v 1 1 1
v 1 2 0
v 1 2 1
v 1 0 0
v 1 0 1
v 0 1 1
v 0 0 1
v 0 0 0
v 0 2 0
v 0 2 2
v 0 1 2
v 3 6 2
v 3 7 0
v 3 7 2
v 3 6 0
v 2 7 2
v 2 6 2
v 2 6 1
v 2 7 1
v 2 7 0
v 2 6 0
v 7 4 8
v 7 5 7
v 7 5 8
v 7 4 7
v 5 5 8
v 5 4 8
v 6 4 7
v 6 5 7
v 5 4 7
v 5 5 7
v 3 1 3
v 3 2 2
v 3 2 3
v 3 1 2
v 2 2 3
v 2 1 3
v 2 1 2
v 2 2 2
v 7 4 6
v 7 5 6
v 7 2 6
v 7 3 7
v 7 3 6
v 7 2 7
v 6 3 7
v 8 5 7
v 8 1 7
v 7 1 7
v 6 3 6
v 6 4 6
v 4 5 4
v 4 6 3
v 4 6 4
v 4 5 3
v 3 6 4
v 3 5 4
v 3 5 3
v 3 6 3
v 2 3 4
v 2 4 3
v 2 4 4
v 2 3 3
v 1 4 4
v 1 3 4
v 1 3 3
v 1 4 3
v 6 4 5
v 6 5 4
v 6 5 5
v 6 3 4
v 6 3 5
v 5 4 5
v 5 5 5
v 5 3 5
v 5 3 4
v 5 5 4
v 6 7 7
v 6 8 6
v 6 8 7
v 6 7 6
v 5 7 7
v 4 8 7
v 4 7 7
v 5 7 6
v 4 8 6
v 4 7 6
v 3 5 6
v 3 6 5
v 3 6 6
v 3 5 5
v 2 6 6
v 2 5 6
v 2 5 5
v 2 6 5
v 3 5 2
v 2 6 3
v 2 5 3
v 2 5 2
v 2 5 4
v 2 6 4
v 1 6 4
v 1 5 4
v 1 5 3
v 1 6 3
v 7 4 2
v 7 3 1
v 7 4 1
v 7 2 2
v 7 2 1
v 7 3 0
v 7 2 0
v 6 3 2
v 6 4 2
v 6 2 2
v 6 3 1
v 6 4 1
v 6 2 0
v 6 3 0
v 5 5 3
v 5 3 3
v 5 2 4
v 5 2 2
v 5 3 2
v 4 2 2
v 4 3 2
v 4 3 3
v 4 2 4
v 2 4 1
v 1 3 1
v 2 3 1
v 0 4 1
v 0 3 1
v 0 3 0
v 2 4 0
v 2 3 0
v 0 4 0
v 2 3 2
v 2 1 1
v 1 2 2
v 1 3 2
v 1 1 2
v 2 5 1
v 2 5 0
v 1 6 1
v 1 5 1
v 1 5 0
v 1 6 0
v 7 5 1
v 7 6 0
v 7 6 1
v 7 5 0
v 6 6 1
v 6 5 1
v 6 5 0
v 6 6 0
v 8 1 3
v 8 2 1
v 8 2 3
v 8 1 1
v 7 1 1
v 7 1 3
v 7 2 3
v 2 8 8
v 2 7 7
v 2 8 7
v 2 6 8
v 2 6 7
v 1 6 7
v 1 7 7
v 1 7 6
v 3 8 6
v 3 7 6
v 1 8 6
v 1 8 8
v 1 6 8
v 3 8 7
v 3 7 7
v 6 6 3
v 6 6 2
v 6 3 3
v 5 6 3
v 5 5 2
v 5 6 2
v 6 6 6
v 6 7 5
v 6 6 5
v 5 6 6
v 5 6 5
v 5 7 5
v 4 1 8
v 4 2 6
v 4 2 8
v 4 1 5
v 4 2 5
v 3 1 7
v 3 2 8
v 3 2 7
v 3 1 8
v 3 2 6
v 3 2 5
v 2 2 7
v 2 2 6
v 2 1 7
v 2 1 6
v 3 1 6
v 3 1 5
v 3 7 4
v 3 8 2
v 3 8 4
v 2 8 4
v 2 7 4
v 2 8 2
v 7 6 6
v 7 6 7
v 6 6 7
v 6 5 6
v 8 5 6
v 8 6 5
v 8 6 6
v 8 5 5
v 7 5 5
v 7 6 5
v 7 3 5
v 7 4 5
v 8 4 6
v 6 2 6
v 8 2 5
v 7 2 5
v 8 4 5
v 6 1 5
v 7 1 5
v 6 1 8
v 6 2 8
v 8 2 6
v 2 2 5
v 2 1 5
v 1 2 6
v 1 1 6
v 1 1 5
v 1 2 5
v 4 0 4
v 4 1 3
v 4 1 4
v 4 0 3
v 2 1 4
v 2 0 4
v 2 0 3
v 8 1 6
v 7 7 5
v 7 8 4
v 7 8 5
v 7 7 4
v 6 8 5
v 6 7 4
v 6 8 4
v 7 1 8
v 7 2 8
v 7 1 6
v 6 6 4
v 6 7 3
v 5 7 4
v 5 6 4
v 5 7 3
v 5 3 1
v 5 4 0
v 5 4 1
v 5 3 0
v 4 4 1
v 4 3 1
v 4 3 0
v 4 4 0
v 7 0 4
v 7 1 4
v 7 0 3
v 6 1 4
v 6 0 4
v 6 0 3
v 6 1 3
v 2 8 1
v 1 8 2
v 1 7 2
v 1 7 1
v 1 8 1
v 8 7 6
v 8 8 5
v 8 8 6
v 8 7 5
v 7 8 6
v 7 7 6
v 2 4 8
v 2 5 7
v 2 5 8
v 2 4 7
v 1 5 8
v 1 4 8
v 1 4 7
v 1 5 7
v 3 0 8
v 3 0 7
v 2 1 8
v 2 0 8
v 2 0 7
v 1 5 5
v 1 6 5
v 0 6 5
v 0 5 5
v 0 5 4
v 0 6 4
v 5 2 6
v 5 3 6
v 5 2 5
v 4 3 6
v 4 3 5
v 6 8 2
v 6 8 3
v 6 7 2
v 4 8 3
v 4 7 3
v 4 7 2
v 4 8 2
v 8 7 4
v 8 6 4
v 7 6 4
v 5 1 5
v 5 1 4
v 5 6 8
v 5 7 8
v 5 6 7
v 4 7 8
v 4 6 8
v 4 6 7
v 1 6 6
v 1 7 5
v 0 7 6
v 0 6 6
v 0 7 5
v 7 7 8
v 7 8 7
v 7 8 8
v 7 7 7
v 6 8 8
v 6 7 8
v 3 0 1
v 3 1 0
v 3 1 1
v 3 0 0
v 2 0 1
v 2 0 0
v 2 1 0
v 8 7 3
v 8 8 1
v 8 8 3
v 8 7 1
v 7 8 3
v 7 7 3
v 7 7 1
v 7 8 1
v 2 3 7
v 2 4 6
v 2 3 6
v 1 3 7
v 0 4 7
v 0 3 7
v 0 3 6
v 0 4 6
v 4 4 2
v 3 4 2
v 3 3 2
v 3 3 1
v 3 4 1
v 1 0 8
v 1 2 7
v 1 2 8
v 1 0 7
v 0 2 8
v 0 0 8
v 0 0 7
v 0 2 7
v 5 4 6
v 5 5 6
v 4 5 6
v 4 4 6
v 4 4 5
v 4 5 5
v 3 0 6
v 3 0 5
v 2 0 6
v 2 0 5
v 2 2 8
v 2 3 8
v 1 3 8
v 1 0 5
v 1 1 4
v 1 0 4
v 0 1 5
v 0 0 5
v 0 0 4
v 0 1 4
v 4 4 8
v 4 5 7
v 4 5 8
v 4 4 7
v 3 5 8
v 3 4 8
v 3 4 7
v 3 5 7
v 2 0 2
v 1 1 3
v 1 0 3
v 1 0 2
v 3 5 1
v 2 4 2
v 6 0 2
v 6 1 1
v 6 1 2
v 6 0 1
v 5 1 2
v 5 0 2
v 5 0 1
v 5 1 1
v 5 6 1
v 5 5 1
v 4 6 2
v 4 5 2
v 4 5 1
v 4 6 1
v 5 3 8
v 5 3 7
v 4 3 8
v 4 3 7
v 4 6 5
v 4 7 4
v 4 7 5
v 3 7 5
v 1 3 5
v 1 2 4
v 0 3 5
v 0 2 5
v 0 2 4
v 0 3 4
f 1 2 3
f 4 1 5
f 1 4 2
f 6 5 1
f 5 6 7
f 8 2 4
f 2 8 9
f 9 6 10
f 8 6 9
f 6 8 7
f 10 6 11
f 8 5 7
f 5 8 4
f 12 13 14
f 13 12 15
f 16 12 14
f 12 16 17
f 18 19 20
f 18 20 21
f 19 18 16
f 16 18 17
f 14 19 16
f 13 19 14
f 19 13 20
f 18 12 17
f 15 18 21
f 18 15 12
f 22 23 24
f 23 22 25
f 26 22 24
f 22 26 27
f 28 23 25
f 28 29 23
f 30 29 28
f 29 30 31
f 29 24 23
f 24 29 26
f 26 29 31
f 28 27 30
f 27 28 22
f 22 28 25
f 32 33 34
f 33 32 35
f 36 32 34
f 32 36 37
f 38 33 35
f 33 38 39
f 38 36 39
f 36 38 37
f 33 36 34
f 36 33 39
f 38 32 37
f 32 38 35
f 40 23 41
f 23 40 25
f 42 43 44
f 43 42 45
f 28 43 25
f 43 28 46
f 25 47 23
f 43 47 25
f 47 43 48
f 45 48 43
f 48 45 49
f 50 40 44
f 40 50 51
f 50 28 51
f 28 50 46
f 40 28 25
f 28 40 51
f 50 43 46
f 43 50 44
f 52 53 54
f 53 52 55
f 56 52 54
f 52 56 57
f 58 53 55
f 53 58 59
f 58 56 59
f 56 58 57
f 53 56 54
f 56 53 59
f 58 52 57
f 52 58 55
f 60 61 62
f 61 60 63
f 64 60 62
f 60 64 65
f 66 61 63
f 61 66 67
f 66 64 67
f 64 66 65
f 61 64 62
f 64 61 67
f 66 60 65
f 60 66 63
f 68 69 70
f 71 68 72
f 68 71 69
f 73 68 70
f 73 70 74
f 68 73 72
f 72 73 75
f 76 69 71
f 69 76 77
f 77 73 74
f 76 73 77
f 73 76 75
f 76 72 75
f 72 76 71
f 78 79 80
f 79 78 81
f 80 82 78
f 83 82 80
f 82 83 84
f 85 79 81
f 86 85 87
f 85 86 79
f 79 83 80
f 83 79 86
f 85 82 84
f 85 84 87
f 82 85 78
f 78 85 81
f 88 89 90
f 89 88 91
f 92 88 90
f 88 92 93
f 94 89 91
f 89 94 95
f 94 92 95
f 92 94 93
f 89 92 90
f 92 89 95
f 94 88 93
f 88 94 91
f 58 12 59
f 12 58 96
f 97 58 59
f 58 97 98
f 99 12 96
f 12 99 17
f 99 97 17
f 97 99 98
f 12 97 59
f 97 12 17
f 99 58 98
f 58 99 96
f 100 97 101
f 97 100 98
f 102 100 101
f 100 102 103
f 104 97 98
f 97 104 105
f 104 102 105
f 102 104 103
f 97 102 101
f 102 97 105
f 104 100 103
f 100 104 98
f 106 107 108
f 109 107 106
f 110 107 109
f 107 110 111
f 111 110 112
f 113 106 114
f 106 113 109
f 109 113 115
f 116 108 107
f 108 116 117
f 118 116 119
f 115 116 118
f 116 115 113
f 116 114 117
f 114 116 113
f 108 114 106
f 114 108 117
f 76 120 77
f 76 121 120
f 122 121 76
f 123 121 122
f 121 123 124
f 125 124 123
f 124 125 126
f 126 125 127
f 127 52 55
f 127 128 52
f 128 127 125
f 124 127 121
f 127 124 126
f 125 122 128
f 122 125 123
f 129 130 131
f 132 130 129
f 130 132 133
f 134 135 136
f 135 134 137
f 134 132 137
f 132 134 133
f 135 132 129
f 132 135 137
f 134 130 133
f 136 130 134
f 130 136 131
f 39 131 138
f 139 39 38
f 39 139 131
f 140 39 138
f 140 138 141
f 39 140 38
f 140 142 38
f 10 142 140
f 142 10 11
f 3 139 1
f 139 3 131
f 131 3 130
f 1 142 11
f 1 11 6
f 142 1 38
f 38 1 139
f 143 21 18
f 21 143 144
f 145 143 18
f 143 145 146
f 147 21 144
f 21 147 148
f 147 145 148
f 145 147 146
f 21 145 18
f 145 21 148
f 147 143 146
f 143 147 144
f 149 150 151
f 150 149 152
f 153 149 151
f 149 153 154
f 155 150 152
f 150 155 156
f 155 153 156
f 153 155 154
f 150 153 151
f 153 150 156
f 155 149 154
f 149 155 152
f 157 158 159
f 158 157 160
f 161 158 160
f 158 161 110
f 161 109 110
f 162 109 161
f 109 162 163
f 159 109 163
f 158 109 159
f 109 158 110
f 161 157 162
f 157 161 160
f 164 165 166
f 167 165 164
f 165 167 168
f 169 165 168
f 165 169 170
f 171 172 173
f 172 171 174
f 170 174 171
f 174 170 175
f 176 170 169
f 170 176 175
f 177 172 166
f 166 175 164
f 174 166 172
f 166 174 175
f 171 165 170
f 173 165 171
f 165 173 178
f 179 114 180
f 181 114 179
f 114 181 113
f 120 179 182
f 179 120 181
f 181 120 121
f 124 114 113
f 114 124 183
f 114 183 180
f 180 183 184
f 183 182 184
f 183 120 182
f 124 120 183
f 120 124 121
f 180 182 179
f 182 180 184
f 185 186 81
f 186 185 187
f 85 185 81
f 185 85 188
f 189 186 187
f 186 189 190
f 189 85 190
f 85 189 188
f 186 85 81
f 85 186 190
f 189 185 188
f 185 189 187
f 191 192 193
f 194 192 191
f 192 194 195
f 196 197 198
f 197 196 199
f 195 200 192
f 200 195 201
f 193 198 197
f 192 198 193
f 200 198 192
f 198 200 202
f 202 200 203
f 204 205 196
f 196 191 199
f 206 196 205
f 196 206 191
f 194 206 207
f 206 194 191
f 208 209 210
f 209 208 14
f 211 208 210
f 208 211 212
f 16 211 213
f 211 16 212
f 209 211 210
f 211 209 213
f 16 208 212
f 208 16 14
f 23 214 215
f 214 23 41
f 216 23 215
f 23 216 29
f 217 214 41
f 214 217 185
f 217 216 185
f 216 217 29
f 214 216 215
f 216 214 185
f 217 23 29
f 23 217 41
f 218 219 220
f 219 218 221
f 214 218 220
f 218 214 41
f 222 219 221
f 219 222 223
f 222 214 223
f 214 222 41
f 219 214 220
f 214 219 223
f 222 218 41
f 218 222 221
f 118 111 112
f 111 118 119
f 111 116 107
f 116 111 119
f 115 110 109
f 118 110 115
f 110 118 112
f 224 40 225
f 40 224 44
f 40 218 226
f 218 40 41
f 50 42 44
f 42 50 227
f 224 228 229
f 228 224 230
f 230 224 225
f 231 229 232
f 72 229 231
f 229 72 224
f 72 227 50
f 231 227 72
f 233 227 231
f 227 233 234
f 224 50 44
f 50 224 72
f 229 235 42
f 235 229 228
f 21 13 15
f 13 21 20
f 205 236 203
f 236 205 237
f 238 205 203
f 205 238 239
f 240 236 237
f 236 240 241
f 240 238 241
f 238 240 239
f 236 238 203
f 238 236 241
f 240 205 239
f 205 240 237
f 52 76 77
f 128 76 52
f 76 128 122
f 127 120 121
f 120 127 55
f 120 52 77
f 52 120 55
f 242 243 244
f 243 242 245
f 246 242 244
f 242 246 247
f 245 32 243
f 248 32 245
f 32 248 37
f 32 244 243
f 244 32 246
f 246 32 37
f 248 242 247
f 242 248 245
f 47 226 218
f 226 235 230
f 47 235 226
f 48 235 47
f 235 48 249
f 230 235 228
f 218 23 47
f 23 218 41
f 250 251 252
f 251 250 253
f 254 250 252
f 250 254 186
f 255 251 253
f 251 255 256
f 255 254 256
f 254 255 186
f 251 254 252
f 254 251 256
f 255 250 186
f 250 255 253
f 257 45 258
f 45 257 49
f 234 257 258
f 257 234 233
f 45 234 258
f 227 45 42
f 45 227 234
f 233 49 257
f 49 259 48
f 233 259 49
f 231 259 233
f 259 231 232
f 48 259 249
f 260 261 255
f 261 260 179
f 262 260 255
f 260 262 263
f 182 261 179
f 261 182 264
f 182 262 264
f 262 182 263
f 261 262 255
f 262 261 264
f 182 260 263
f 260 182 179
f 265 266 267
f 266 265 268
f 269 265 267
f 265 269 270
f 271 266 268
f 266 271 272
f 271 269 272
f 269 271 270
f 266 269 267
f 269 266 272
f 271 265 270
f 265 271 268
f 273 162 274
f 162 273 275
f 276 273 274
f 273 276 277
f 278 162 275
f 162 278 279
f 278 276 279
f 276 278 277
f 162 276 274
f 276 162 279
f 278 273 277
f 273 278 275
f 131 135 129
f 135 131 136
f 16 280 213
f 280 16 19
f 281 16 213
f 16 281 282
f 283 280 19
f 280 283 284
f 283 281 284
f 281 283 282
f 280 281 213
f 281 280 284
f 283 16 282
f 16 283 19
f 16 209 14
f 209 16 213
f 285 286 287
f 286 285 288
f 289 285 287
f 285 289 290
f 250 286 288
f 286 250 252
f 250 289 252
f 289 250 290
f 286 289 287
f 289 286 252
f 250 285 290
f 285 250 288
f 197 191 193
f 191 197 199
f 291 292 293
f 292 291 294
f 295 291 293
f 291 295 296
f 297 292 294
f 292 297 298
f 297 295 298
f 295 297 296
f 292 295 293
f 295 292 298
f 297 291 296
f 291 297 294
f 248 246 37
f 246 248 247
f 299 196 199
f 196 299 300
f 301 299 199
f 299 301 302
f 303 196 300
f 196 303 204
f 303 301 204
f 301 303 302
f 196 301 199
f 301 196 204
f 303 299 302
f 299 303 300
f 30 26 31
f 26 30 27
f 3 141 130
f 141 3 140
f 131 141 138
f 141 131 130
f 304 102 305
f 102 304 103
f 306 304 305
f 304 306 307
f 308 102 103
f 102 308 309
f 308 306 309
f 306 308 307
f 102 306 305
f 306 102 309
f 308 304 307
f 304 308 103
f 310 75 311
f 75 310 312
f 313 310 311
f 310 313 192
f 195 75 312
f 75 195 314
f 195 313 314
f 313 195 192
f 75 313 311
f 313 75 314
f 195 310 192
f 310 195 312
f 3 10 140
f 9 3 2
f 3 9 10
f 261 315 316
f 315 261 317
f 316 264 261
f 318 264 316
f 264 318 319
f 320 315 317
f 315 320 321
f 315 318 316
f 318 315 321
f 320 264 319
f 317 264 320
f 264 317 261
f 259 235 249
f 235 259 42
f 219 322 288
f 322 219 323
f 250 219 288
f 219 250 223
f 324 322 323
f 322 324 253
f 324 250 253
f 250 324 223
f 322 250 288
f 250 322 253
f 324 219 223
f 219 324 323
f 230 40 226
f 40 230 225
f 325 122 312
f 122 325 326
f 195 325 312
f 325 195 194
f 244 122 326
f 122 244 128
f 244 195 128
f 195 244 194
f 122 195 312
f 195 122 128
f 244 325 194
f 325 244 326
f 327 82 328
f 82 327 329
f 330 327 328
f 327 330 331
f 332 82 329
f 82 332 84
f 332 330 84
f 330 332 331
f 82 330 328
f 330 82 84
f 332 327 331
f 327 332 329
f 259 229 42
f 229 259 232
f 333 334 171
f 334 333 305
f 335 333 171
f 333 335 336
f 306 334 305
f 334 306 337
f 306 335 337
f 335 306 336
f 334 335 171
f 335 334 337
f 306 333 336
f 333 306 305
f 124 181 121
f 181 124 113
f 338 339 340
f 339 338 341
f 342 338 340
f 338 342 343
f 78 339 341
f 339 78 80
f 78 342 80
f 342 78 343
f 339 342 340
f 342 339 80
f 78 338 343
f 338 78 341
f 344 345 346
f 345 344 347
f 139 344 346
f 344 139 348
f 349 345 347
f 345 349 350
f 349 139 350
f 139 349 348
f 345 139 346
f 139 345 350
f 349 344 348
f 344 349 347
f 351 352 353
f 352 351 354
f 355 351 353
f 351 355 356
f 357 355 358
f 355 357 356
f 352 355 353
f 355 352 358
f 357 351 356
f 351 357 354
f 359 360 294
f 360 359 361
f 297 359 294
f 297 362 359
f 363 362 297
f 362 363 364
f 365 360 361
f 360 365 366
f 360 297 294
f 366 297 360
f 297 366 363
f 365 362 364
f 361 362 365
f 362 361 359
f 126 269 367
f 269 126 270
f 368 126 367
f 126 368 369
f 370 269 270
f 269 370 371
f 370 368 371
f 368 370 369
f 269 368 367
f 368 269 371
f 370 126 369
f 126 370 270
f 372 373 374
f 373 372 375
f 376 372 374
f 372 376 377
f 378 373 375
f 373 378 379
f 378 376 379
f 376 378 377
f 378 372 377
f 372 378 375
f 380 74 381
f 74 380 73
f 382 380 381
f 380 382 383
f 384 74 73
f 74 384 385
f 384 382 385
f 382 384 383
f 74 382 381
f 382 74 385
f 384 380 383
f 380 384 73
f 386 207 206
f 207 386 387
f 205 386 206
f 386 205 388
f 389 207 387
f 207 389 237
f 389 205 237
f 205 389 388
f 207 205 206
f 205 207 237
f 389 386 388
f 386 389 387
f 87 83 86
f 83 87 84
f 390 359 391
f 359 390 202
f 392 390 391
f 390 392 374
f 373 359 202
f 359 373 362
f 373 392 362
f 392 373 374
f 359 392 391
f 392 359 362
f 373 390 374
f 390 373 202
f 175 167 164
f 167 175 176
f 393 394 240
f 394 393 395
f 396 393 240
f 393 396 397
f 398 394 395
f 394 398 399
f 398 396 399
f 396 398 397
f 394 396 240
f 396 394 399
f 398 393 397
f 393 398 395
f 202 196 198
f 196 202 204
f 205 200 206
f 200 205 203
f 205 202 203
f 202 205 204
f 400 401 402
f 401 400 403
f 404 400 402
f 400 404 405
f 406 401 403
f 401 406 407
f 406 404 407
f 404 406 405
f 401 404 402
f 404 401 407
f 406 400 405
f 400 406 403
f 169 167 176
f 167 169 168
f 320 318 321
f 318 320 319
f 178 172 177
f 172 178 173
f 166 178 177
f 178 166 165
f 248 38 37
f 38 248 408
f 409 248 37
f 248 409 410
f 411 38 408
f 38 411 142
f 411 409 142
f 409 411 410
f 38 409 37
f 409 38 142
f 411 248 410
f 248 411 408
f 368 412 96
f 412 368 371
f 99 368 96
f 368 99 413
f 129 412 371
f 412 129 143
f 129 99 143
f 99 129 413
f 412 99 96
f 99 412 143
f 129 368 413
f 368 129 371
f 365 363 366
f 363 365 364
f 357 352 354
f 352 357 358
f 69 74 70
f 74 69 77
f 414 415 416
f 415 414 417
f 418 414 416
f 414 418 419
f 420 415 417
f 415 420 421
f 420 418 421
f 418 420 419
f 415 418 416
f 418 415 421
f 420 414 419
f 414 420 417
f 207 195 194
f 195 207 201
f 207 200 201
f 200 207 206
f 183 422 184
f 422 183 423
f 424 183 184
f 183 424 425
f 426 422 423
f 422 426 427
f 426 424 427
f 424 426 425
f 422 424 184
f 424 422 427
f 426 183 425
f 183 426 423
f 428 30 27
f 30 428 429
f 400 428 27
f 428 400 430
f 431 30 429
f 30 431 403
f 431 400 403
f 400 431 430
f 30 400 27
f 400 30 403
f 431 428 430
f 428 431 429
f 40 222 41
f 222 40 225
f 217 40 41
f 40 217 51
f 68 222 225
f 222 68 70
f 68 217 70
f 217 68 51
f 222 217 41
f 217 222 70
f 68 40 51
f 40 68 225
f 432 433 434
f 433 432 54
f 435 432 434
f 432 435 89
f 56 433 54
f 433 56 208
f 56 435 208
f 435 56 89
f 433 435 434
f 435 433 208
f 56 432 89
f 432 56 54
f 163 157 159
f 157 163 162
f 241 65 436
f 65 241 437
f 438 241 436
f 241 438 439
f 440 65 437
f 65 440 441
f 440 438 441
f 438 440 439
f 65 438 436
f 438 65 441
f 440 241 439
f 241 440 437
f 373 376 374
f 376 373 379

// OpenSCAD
union() {
    translate([0, 0, 0]) cube([1, 1, 1]);
    translate([2, 6, 1]) cube([1, 1, 1]);
    translate([6, 4, 7]) cube([1, 1, 1]);
    translate([2, 1, 2]) cube([1, 1, 1]);
    translate([6, 3, 6]) cube([1, 1, 1]);
    translate([3, 5, 3]) cube([1, 1, 1]);
    translate([1, 3, 3]) cube([1, 1, 1]);
    translate([5, 3, 4]) cube([1, 1, 1]);
    translate([5, 7, 6]) cube([1, 1, 1]);
    translate([2, 5, 5]) cube([1, 1, 1]);
    translate([2, 5, 2]) cube([1, 1, 1]);
    translate([1, 5, 3]) cube([1, 1, 1]);
    translate([6, 3, 1]) cube([1, 1, 1]);
    translate([4, 2, 2]) cube([1, 1, 1]);
    translate([0, 3, 0]) cube([1, 1, 1]);
    translate([1, 1, 1]) cube([1, 1, 1]);
    translate([1, 5, 0]) cube([1, 1, 1]);
    translate([6, 5, 0]) cube([1, 1, 1]);
    translate([7, 1, 1]) cube([1, 1, 1]);
    translate([1, 7, 6]) cube([1, 1, 1]);
    translate([5, 5, 2]) cube([1, 1, 1]);
    translate([5, 6, 5]) cube([1, 1, 1]);
    translate([3, 1, 6]) cube([1, 1, 1]);
    translate([2, 7, 3]) cube([1, 1, 1]);
    translate([6, 5, 6]) cube([1, 1, 1]);
    translate([7, 5, 5]) cube([1, 1, 1]);
    translate([6, 2, 0]) cube([1, 1, 1]);
    translate([6, 2, 5]) cube([1, 1, 1]);
    translate([2, 6, 0]) cube([1, 1, 1]);
    translate([1, 1, 5]) cube([1, 1, 1]);
    translate([4, 4, 3]) cube([1, 1, 1]);
    translate([3, 0, 3]) cube([1, 1, 1]);
    translate([7, 4, 6]) cube([1, 1, 1]);
    translate([6, 7, 4]) cube([1, 1, 1]);
    translate([6, 1, 7]) cube([1, 1, 1]);
    translate([5, 6, 3]) cube([1, 1, 1]);
    translate([4, 3, 0]) cube([1, 1, 1]);
    translate([6, 0, 3]) cube([1, 1, 1]);
    translate([1, 3, 0]) cube([1, 1, 1]);
    translate([1, 7, 1]) cube([1, 1, 1]);
    translate([2, 7, 2]) cube([1, 1, 1]);
    translate([7, 7, 5]) cube([1, 1, 1]);
    translate([3, 1, 7]) cube([1, 1, 1]);
    translate([5, 4, 2]) cube([1, 1, 1]);
    translate([1, 4, 7]) cube([1, 1, 1]);
    translate([2, 0, 3]) cube([1, 1, 1]);
    translate([2, 0, 7]) cube([1, 1, 1]);
    translate([5, 4, 7]) cube([1, 1, 1]);
    translate([1, 2, 1]) cube([1, 1, 1]);
    translate([0, 5, 4]) cube([1, 1, 1]);
    translate([4, 2, 5]) cube([1, 1, 1]);
    translate([0, 1, 1]) cube([1, 1, 1]);
    translate([4, 3, 3]) cube([1, 1, 1]);
    translate([5, 7, 2]) cube([1, 1, 1]);
    translate([6, 1, 6]) cube([1, 1, 1]);
    translate([4, 2, 3]) cube([1, 1, 1]);
    translate([7, 6, 4]) cube([1, 1, 1]);
    translate([7, 3, 5]) cube([1, 1, 1]);
    translate([7, 2, 6]) cube([1, 1, 1]);
    translate([4, 1, 4]) cube([1, 1, 1]);
    translate([4, 6, 7]) cube([1, 1, 1]);
    translate([6, 1, 5]) cube([1, 1, 1]);
    translate([0, 6, 5]) cube([1, 1, 1]);
    translate([5, 3, 2]) cube([1, 1, 1]);
    translate([7, 2, 5]) cube([1, 1, 1]);
    translate([6, 7, 7]) cube([1, 1, 1]);
    translate([2, 0, 0]) cube([1, 1, 1]);
    translate([7, 7, 2]) cube([1, 1, 1]);
    translate([1, 3, 6]) cube([1, 1, 1]);
    translate([3, 3, 1]) cube([1, 1, 1]);
    translate([0, 0, 7]) cube([1, 1, 1]);
    translate([4, 4, 5]) cube([1, 1, 1]);
    translate([7, 3, 6]) cube([1, 1, 1]);
    translate([2, 0, 5]) cube([1, 1, 1]);
    translate([4, 7, 6]) cube([1, 1, 1]);
    translate([1, 2, 7]) cube([1, 1, 1]);
    translate([1, 7, 7]) cube([1, 1, 1]);
    translate([0, 0, 4]) cube([1, 1, 1]);
    translate([2, 1, 6]) cube([1, 1, 1]);
    translate([3, 4, 7]) cube([1, 1, 1]);
    translate([1, 6, 7]) cube([1, 1, 1]);
    translate([0, 1, 0]) cube([1, 1, 1]);
    translate([4, 7, 2]) cube([1, 1, 1]);
    translate([2, 7, 6]) cube([1, 1, 1]);
    translate([1, 0, 2]) cube([1, 1, 1]);
    translate([2, 4, 1]) cube([1, 1, 1]);
    translate([6, 2, 1]) cube([1, 1, 1]);
    translate([0, 3, 6]) cube([1, 1, 1]);
    translate([7, 7, 1]) cube([1, 1, 1]);
    translate([5, 4, 4]) cube([1, 1, 1]);
    translate([5, 0, 1]) cube([1, 1, 1]);
    translate([3, 1, 5]) cube([1, 1, 1]);
    translate([4, 5, 1]) cube([1, 1, 1]);
    translate([4, 3, 7]) cube([1, 1, 1]);
    translate([7, 1, 6]) cube([1, 1, 1]);
    translate([6, 4, 5]) cube([1, 1, 1]);
    translate([3, 6, 4]) cube([1, 1, 1]);
    translate([7, 1, 2]) cube([1, 1, 1]);
    translate([0, 2, 4]) cube([1, 1, 1]);
    translate([0, 1, 7]) cube([1, 1, 1]);
}
